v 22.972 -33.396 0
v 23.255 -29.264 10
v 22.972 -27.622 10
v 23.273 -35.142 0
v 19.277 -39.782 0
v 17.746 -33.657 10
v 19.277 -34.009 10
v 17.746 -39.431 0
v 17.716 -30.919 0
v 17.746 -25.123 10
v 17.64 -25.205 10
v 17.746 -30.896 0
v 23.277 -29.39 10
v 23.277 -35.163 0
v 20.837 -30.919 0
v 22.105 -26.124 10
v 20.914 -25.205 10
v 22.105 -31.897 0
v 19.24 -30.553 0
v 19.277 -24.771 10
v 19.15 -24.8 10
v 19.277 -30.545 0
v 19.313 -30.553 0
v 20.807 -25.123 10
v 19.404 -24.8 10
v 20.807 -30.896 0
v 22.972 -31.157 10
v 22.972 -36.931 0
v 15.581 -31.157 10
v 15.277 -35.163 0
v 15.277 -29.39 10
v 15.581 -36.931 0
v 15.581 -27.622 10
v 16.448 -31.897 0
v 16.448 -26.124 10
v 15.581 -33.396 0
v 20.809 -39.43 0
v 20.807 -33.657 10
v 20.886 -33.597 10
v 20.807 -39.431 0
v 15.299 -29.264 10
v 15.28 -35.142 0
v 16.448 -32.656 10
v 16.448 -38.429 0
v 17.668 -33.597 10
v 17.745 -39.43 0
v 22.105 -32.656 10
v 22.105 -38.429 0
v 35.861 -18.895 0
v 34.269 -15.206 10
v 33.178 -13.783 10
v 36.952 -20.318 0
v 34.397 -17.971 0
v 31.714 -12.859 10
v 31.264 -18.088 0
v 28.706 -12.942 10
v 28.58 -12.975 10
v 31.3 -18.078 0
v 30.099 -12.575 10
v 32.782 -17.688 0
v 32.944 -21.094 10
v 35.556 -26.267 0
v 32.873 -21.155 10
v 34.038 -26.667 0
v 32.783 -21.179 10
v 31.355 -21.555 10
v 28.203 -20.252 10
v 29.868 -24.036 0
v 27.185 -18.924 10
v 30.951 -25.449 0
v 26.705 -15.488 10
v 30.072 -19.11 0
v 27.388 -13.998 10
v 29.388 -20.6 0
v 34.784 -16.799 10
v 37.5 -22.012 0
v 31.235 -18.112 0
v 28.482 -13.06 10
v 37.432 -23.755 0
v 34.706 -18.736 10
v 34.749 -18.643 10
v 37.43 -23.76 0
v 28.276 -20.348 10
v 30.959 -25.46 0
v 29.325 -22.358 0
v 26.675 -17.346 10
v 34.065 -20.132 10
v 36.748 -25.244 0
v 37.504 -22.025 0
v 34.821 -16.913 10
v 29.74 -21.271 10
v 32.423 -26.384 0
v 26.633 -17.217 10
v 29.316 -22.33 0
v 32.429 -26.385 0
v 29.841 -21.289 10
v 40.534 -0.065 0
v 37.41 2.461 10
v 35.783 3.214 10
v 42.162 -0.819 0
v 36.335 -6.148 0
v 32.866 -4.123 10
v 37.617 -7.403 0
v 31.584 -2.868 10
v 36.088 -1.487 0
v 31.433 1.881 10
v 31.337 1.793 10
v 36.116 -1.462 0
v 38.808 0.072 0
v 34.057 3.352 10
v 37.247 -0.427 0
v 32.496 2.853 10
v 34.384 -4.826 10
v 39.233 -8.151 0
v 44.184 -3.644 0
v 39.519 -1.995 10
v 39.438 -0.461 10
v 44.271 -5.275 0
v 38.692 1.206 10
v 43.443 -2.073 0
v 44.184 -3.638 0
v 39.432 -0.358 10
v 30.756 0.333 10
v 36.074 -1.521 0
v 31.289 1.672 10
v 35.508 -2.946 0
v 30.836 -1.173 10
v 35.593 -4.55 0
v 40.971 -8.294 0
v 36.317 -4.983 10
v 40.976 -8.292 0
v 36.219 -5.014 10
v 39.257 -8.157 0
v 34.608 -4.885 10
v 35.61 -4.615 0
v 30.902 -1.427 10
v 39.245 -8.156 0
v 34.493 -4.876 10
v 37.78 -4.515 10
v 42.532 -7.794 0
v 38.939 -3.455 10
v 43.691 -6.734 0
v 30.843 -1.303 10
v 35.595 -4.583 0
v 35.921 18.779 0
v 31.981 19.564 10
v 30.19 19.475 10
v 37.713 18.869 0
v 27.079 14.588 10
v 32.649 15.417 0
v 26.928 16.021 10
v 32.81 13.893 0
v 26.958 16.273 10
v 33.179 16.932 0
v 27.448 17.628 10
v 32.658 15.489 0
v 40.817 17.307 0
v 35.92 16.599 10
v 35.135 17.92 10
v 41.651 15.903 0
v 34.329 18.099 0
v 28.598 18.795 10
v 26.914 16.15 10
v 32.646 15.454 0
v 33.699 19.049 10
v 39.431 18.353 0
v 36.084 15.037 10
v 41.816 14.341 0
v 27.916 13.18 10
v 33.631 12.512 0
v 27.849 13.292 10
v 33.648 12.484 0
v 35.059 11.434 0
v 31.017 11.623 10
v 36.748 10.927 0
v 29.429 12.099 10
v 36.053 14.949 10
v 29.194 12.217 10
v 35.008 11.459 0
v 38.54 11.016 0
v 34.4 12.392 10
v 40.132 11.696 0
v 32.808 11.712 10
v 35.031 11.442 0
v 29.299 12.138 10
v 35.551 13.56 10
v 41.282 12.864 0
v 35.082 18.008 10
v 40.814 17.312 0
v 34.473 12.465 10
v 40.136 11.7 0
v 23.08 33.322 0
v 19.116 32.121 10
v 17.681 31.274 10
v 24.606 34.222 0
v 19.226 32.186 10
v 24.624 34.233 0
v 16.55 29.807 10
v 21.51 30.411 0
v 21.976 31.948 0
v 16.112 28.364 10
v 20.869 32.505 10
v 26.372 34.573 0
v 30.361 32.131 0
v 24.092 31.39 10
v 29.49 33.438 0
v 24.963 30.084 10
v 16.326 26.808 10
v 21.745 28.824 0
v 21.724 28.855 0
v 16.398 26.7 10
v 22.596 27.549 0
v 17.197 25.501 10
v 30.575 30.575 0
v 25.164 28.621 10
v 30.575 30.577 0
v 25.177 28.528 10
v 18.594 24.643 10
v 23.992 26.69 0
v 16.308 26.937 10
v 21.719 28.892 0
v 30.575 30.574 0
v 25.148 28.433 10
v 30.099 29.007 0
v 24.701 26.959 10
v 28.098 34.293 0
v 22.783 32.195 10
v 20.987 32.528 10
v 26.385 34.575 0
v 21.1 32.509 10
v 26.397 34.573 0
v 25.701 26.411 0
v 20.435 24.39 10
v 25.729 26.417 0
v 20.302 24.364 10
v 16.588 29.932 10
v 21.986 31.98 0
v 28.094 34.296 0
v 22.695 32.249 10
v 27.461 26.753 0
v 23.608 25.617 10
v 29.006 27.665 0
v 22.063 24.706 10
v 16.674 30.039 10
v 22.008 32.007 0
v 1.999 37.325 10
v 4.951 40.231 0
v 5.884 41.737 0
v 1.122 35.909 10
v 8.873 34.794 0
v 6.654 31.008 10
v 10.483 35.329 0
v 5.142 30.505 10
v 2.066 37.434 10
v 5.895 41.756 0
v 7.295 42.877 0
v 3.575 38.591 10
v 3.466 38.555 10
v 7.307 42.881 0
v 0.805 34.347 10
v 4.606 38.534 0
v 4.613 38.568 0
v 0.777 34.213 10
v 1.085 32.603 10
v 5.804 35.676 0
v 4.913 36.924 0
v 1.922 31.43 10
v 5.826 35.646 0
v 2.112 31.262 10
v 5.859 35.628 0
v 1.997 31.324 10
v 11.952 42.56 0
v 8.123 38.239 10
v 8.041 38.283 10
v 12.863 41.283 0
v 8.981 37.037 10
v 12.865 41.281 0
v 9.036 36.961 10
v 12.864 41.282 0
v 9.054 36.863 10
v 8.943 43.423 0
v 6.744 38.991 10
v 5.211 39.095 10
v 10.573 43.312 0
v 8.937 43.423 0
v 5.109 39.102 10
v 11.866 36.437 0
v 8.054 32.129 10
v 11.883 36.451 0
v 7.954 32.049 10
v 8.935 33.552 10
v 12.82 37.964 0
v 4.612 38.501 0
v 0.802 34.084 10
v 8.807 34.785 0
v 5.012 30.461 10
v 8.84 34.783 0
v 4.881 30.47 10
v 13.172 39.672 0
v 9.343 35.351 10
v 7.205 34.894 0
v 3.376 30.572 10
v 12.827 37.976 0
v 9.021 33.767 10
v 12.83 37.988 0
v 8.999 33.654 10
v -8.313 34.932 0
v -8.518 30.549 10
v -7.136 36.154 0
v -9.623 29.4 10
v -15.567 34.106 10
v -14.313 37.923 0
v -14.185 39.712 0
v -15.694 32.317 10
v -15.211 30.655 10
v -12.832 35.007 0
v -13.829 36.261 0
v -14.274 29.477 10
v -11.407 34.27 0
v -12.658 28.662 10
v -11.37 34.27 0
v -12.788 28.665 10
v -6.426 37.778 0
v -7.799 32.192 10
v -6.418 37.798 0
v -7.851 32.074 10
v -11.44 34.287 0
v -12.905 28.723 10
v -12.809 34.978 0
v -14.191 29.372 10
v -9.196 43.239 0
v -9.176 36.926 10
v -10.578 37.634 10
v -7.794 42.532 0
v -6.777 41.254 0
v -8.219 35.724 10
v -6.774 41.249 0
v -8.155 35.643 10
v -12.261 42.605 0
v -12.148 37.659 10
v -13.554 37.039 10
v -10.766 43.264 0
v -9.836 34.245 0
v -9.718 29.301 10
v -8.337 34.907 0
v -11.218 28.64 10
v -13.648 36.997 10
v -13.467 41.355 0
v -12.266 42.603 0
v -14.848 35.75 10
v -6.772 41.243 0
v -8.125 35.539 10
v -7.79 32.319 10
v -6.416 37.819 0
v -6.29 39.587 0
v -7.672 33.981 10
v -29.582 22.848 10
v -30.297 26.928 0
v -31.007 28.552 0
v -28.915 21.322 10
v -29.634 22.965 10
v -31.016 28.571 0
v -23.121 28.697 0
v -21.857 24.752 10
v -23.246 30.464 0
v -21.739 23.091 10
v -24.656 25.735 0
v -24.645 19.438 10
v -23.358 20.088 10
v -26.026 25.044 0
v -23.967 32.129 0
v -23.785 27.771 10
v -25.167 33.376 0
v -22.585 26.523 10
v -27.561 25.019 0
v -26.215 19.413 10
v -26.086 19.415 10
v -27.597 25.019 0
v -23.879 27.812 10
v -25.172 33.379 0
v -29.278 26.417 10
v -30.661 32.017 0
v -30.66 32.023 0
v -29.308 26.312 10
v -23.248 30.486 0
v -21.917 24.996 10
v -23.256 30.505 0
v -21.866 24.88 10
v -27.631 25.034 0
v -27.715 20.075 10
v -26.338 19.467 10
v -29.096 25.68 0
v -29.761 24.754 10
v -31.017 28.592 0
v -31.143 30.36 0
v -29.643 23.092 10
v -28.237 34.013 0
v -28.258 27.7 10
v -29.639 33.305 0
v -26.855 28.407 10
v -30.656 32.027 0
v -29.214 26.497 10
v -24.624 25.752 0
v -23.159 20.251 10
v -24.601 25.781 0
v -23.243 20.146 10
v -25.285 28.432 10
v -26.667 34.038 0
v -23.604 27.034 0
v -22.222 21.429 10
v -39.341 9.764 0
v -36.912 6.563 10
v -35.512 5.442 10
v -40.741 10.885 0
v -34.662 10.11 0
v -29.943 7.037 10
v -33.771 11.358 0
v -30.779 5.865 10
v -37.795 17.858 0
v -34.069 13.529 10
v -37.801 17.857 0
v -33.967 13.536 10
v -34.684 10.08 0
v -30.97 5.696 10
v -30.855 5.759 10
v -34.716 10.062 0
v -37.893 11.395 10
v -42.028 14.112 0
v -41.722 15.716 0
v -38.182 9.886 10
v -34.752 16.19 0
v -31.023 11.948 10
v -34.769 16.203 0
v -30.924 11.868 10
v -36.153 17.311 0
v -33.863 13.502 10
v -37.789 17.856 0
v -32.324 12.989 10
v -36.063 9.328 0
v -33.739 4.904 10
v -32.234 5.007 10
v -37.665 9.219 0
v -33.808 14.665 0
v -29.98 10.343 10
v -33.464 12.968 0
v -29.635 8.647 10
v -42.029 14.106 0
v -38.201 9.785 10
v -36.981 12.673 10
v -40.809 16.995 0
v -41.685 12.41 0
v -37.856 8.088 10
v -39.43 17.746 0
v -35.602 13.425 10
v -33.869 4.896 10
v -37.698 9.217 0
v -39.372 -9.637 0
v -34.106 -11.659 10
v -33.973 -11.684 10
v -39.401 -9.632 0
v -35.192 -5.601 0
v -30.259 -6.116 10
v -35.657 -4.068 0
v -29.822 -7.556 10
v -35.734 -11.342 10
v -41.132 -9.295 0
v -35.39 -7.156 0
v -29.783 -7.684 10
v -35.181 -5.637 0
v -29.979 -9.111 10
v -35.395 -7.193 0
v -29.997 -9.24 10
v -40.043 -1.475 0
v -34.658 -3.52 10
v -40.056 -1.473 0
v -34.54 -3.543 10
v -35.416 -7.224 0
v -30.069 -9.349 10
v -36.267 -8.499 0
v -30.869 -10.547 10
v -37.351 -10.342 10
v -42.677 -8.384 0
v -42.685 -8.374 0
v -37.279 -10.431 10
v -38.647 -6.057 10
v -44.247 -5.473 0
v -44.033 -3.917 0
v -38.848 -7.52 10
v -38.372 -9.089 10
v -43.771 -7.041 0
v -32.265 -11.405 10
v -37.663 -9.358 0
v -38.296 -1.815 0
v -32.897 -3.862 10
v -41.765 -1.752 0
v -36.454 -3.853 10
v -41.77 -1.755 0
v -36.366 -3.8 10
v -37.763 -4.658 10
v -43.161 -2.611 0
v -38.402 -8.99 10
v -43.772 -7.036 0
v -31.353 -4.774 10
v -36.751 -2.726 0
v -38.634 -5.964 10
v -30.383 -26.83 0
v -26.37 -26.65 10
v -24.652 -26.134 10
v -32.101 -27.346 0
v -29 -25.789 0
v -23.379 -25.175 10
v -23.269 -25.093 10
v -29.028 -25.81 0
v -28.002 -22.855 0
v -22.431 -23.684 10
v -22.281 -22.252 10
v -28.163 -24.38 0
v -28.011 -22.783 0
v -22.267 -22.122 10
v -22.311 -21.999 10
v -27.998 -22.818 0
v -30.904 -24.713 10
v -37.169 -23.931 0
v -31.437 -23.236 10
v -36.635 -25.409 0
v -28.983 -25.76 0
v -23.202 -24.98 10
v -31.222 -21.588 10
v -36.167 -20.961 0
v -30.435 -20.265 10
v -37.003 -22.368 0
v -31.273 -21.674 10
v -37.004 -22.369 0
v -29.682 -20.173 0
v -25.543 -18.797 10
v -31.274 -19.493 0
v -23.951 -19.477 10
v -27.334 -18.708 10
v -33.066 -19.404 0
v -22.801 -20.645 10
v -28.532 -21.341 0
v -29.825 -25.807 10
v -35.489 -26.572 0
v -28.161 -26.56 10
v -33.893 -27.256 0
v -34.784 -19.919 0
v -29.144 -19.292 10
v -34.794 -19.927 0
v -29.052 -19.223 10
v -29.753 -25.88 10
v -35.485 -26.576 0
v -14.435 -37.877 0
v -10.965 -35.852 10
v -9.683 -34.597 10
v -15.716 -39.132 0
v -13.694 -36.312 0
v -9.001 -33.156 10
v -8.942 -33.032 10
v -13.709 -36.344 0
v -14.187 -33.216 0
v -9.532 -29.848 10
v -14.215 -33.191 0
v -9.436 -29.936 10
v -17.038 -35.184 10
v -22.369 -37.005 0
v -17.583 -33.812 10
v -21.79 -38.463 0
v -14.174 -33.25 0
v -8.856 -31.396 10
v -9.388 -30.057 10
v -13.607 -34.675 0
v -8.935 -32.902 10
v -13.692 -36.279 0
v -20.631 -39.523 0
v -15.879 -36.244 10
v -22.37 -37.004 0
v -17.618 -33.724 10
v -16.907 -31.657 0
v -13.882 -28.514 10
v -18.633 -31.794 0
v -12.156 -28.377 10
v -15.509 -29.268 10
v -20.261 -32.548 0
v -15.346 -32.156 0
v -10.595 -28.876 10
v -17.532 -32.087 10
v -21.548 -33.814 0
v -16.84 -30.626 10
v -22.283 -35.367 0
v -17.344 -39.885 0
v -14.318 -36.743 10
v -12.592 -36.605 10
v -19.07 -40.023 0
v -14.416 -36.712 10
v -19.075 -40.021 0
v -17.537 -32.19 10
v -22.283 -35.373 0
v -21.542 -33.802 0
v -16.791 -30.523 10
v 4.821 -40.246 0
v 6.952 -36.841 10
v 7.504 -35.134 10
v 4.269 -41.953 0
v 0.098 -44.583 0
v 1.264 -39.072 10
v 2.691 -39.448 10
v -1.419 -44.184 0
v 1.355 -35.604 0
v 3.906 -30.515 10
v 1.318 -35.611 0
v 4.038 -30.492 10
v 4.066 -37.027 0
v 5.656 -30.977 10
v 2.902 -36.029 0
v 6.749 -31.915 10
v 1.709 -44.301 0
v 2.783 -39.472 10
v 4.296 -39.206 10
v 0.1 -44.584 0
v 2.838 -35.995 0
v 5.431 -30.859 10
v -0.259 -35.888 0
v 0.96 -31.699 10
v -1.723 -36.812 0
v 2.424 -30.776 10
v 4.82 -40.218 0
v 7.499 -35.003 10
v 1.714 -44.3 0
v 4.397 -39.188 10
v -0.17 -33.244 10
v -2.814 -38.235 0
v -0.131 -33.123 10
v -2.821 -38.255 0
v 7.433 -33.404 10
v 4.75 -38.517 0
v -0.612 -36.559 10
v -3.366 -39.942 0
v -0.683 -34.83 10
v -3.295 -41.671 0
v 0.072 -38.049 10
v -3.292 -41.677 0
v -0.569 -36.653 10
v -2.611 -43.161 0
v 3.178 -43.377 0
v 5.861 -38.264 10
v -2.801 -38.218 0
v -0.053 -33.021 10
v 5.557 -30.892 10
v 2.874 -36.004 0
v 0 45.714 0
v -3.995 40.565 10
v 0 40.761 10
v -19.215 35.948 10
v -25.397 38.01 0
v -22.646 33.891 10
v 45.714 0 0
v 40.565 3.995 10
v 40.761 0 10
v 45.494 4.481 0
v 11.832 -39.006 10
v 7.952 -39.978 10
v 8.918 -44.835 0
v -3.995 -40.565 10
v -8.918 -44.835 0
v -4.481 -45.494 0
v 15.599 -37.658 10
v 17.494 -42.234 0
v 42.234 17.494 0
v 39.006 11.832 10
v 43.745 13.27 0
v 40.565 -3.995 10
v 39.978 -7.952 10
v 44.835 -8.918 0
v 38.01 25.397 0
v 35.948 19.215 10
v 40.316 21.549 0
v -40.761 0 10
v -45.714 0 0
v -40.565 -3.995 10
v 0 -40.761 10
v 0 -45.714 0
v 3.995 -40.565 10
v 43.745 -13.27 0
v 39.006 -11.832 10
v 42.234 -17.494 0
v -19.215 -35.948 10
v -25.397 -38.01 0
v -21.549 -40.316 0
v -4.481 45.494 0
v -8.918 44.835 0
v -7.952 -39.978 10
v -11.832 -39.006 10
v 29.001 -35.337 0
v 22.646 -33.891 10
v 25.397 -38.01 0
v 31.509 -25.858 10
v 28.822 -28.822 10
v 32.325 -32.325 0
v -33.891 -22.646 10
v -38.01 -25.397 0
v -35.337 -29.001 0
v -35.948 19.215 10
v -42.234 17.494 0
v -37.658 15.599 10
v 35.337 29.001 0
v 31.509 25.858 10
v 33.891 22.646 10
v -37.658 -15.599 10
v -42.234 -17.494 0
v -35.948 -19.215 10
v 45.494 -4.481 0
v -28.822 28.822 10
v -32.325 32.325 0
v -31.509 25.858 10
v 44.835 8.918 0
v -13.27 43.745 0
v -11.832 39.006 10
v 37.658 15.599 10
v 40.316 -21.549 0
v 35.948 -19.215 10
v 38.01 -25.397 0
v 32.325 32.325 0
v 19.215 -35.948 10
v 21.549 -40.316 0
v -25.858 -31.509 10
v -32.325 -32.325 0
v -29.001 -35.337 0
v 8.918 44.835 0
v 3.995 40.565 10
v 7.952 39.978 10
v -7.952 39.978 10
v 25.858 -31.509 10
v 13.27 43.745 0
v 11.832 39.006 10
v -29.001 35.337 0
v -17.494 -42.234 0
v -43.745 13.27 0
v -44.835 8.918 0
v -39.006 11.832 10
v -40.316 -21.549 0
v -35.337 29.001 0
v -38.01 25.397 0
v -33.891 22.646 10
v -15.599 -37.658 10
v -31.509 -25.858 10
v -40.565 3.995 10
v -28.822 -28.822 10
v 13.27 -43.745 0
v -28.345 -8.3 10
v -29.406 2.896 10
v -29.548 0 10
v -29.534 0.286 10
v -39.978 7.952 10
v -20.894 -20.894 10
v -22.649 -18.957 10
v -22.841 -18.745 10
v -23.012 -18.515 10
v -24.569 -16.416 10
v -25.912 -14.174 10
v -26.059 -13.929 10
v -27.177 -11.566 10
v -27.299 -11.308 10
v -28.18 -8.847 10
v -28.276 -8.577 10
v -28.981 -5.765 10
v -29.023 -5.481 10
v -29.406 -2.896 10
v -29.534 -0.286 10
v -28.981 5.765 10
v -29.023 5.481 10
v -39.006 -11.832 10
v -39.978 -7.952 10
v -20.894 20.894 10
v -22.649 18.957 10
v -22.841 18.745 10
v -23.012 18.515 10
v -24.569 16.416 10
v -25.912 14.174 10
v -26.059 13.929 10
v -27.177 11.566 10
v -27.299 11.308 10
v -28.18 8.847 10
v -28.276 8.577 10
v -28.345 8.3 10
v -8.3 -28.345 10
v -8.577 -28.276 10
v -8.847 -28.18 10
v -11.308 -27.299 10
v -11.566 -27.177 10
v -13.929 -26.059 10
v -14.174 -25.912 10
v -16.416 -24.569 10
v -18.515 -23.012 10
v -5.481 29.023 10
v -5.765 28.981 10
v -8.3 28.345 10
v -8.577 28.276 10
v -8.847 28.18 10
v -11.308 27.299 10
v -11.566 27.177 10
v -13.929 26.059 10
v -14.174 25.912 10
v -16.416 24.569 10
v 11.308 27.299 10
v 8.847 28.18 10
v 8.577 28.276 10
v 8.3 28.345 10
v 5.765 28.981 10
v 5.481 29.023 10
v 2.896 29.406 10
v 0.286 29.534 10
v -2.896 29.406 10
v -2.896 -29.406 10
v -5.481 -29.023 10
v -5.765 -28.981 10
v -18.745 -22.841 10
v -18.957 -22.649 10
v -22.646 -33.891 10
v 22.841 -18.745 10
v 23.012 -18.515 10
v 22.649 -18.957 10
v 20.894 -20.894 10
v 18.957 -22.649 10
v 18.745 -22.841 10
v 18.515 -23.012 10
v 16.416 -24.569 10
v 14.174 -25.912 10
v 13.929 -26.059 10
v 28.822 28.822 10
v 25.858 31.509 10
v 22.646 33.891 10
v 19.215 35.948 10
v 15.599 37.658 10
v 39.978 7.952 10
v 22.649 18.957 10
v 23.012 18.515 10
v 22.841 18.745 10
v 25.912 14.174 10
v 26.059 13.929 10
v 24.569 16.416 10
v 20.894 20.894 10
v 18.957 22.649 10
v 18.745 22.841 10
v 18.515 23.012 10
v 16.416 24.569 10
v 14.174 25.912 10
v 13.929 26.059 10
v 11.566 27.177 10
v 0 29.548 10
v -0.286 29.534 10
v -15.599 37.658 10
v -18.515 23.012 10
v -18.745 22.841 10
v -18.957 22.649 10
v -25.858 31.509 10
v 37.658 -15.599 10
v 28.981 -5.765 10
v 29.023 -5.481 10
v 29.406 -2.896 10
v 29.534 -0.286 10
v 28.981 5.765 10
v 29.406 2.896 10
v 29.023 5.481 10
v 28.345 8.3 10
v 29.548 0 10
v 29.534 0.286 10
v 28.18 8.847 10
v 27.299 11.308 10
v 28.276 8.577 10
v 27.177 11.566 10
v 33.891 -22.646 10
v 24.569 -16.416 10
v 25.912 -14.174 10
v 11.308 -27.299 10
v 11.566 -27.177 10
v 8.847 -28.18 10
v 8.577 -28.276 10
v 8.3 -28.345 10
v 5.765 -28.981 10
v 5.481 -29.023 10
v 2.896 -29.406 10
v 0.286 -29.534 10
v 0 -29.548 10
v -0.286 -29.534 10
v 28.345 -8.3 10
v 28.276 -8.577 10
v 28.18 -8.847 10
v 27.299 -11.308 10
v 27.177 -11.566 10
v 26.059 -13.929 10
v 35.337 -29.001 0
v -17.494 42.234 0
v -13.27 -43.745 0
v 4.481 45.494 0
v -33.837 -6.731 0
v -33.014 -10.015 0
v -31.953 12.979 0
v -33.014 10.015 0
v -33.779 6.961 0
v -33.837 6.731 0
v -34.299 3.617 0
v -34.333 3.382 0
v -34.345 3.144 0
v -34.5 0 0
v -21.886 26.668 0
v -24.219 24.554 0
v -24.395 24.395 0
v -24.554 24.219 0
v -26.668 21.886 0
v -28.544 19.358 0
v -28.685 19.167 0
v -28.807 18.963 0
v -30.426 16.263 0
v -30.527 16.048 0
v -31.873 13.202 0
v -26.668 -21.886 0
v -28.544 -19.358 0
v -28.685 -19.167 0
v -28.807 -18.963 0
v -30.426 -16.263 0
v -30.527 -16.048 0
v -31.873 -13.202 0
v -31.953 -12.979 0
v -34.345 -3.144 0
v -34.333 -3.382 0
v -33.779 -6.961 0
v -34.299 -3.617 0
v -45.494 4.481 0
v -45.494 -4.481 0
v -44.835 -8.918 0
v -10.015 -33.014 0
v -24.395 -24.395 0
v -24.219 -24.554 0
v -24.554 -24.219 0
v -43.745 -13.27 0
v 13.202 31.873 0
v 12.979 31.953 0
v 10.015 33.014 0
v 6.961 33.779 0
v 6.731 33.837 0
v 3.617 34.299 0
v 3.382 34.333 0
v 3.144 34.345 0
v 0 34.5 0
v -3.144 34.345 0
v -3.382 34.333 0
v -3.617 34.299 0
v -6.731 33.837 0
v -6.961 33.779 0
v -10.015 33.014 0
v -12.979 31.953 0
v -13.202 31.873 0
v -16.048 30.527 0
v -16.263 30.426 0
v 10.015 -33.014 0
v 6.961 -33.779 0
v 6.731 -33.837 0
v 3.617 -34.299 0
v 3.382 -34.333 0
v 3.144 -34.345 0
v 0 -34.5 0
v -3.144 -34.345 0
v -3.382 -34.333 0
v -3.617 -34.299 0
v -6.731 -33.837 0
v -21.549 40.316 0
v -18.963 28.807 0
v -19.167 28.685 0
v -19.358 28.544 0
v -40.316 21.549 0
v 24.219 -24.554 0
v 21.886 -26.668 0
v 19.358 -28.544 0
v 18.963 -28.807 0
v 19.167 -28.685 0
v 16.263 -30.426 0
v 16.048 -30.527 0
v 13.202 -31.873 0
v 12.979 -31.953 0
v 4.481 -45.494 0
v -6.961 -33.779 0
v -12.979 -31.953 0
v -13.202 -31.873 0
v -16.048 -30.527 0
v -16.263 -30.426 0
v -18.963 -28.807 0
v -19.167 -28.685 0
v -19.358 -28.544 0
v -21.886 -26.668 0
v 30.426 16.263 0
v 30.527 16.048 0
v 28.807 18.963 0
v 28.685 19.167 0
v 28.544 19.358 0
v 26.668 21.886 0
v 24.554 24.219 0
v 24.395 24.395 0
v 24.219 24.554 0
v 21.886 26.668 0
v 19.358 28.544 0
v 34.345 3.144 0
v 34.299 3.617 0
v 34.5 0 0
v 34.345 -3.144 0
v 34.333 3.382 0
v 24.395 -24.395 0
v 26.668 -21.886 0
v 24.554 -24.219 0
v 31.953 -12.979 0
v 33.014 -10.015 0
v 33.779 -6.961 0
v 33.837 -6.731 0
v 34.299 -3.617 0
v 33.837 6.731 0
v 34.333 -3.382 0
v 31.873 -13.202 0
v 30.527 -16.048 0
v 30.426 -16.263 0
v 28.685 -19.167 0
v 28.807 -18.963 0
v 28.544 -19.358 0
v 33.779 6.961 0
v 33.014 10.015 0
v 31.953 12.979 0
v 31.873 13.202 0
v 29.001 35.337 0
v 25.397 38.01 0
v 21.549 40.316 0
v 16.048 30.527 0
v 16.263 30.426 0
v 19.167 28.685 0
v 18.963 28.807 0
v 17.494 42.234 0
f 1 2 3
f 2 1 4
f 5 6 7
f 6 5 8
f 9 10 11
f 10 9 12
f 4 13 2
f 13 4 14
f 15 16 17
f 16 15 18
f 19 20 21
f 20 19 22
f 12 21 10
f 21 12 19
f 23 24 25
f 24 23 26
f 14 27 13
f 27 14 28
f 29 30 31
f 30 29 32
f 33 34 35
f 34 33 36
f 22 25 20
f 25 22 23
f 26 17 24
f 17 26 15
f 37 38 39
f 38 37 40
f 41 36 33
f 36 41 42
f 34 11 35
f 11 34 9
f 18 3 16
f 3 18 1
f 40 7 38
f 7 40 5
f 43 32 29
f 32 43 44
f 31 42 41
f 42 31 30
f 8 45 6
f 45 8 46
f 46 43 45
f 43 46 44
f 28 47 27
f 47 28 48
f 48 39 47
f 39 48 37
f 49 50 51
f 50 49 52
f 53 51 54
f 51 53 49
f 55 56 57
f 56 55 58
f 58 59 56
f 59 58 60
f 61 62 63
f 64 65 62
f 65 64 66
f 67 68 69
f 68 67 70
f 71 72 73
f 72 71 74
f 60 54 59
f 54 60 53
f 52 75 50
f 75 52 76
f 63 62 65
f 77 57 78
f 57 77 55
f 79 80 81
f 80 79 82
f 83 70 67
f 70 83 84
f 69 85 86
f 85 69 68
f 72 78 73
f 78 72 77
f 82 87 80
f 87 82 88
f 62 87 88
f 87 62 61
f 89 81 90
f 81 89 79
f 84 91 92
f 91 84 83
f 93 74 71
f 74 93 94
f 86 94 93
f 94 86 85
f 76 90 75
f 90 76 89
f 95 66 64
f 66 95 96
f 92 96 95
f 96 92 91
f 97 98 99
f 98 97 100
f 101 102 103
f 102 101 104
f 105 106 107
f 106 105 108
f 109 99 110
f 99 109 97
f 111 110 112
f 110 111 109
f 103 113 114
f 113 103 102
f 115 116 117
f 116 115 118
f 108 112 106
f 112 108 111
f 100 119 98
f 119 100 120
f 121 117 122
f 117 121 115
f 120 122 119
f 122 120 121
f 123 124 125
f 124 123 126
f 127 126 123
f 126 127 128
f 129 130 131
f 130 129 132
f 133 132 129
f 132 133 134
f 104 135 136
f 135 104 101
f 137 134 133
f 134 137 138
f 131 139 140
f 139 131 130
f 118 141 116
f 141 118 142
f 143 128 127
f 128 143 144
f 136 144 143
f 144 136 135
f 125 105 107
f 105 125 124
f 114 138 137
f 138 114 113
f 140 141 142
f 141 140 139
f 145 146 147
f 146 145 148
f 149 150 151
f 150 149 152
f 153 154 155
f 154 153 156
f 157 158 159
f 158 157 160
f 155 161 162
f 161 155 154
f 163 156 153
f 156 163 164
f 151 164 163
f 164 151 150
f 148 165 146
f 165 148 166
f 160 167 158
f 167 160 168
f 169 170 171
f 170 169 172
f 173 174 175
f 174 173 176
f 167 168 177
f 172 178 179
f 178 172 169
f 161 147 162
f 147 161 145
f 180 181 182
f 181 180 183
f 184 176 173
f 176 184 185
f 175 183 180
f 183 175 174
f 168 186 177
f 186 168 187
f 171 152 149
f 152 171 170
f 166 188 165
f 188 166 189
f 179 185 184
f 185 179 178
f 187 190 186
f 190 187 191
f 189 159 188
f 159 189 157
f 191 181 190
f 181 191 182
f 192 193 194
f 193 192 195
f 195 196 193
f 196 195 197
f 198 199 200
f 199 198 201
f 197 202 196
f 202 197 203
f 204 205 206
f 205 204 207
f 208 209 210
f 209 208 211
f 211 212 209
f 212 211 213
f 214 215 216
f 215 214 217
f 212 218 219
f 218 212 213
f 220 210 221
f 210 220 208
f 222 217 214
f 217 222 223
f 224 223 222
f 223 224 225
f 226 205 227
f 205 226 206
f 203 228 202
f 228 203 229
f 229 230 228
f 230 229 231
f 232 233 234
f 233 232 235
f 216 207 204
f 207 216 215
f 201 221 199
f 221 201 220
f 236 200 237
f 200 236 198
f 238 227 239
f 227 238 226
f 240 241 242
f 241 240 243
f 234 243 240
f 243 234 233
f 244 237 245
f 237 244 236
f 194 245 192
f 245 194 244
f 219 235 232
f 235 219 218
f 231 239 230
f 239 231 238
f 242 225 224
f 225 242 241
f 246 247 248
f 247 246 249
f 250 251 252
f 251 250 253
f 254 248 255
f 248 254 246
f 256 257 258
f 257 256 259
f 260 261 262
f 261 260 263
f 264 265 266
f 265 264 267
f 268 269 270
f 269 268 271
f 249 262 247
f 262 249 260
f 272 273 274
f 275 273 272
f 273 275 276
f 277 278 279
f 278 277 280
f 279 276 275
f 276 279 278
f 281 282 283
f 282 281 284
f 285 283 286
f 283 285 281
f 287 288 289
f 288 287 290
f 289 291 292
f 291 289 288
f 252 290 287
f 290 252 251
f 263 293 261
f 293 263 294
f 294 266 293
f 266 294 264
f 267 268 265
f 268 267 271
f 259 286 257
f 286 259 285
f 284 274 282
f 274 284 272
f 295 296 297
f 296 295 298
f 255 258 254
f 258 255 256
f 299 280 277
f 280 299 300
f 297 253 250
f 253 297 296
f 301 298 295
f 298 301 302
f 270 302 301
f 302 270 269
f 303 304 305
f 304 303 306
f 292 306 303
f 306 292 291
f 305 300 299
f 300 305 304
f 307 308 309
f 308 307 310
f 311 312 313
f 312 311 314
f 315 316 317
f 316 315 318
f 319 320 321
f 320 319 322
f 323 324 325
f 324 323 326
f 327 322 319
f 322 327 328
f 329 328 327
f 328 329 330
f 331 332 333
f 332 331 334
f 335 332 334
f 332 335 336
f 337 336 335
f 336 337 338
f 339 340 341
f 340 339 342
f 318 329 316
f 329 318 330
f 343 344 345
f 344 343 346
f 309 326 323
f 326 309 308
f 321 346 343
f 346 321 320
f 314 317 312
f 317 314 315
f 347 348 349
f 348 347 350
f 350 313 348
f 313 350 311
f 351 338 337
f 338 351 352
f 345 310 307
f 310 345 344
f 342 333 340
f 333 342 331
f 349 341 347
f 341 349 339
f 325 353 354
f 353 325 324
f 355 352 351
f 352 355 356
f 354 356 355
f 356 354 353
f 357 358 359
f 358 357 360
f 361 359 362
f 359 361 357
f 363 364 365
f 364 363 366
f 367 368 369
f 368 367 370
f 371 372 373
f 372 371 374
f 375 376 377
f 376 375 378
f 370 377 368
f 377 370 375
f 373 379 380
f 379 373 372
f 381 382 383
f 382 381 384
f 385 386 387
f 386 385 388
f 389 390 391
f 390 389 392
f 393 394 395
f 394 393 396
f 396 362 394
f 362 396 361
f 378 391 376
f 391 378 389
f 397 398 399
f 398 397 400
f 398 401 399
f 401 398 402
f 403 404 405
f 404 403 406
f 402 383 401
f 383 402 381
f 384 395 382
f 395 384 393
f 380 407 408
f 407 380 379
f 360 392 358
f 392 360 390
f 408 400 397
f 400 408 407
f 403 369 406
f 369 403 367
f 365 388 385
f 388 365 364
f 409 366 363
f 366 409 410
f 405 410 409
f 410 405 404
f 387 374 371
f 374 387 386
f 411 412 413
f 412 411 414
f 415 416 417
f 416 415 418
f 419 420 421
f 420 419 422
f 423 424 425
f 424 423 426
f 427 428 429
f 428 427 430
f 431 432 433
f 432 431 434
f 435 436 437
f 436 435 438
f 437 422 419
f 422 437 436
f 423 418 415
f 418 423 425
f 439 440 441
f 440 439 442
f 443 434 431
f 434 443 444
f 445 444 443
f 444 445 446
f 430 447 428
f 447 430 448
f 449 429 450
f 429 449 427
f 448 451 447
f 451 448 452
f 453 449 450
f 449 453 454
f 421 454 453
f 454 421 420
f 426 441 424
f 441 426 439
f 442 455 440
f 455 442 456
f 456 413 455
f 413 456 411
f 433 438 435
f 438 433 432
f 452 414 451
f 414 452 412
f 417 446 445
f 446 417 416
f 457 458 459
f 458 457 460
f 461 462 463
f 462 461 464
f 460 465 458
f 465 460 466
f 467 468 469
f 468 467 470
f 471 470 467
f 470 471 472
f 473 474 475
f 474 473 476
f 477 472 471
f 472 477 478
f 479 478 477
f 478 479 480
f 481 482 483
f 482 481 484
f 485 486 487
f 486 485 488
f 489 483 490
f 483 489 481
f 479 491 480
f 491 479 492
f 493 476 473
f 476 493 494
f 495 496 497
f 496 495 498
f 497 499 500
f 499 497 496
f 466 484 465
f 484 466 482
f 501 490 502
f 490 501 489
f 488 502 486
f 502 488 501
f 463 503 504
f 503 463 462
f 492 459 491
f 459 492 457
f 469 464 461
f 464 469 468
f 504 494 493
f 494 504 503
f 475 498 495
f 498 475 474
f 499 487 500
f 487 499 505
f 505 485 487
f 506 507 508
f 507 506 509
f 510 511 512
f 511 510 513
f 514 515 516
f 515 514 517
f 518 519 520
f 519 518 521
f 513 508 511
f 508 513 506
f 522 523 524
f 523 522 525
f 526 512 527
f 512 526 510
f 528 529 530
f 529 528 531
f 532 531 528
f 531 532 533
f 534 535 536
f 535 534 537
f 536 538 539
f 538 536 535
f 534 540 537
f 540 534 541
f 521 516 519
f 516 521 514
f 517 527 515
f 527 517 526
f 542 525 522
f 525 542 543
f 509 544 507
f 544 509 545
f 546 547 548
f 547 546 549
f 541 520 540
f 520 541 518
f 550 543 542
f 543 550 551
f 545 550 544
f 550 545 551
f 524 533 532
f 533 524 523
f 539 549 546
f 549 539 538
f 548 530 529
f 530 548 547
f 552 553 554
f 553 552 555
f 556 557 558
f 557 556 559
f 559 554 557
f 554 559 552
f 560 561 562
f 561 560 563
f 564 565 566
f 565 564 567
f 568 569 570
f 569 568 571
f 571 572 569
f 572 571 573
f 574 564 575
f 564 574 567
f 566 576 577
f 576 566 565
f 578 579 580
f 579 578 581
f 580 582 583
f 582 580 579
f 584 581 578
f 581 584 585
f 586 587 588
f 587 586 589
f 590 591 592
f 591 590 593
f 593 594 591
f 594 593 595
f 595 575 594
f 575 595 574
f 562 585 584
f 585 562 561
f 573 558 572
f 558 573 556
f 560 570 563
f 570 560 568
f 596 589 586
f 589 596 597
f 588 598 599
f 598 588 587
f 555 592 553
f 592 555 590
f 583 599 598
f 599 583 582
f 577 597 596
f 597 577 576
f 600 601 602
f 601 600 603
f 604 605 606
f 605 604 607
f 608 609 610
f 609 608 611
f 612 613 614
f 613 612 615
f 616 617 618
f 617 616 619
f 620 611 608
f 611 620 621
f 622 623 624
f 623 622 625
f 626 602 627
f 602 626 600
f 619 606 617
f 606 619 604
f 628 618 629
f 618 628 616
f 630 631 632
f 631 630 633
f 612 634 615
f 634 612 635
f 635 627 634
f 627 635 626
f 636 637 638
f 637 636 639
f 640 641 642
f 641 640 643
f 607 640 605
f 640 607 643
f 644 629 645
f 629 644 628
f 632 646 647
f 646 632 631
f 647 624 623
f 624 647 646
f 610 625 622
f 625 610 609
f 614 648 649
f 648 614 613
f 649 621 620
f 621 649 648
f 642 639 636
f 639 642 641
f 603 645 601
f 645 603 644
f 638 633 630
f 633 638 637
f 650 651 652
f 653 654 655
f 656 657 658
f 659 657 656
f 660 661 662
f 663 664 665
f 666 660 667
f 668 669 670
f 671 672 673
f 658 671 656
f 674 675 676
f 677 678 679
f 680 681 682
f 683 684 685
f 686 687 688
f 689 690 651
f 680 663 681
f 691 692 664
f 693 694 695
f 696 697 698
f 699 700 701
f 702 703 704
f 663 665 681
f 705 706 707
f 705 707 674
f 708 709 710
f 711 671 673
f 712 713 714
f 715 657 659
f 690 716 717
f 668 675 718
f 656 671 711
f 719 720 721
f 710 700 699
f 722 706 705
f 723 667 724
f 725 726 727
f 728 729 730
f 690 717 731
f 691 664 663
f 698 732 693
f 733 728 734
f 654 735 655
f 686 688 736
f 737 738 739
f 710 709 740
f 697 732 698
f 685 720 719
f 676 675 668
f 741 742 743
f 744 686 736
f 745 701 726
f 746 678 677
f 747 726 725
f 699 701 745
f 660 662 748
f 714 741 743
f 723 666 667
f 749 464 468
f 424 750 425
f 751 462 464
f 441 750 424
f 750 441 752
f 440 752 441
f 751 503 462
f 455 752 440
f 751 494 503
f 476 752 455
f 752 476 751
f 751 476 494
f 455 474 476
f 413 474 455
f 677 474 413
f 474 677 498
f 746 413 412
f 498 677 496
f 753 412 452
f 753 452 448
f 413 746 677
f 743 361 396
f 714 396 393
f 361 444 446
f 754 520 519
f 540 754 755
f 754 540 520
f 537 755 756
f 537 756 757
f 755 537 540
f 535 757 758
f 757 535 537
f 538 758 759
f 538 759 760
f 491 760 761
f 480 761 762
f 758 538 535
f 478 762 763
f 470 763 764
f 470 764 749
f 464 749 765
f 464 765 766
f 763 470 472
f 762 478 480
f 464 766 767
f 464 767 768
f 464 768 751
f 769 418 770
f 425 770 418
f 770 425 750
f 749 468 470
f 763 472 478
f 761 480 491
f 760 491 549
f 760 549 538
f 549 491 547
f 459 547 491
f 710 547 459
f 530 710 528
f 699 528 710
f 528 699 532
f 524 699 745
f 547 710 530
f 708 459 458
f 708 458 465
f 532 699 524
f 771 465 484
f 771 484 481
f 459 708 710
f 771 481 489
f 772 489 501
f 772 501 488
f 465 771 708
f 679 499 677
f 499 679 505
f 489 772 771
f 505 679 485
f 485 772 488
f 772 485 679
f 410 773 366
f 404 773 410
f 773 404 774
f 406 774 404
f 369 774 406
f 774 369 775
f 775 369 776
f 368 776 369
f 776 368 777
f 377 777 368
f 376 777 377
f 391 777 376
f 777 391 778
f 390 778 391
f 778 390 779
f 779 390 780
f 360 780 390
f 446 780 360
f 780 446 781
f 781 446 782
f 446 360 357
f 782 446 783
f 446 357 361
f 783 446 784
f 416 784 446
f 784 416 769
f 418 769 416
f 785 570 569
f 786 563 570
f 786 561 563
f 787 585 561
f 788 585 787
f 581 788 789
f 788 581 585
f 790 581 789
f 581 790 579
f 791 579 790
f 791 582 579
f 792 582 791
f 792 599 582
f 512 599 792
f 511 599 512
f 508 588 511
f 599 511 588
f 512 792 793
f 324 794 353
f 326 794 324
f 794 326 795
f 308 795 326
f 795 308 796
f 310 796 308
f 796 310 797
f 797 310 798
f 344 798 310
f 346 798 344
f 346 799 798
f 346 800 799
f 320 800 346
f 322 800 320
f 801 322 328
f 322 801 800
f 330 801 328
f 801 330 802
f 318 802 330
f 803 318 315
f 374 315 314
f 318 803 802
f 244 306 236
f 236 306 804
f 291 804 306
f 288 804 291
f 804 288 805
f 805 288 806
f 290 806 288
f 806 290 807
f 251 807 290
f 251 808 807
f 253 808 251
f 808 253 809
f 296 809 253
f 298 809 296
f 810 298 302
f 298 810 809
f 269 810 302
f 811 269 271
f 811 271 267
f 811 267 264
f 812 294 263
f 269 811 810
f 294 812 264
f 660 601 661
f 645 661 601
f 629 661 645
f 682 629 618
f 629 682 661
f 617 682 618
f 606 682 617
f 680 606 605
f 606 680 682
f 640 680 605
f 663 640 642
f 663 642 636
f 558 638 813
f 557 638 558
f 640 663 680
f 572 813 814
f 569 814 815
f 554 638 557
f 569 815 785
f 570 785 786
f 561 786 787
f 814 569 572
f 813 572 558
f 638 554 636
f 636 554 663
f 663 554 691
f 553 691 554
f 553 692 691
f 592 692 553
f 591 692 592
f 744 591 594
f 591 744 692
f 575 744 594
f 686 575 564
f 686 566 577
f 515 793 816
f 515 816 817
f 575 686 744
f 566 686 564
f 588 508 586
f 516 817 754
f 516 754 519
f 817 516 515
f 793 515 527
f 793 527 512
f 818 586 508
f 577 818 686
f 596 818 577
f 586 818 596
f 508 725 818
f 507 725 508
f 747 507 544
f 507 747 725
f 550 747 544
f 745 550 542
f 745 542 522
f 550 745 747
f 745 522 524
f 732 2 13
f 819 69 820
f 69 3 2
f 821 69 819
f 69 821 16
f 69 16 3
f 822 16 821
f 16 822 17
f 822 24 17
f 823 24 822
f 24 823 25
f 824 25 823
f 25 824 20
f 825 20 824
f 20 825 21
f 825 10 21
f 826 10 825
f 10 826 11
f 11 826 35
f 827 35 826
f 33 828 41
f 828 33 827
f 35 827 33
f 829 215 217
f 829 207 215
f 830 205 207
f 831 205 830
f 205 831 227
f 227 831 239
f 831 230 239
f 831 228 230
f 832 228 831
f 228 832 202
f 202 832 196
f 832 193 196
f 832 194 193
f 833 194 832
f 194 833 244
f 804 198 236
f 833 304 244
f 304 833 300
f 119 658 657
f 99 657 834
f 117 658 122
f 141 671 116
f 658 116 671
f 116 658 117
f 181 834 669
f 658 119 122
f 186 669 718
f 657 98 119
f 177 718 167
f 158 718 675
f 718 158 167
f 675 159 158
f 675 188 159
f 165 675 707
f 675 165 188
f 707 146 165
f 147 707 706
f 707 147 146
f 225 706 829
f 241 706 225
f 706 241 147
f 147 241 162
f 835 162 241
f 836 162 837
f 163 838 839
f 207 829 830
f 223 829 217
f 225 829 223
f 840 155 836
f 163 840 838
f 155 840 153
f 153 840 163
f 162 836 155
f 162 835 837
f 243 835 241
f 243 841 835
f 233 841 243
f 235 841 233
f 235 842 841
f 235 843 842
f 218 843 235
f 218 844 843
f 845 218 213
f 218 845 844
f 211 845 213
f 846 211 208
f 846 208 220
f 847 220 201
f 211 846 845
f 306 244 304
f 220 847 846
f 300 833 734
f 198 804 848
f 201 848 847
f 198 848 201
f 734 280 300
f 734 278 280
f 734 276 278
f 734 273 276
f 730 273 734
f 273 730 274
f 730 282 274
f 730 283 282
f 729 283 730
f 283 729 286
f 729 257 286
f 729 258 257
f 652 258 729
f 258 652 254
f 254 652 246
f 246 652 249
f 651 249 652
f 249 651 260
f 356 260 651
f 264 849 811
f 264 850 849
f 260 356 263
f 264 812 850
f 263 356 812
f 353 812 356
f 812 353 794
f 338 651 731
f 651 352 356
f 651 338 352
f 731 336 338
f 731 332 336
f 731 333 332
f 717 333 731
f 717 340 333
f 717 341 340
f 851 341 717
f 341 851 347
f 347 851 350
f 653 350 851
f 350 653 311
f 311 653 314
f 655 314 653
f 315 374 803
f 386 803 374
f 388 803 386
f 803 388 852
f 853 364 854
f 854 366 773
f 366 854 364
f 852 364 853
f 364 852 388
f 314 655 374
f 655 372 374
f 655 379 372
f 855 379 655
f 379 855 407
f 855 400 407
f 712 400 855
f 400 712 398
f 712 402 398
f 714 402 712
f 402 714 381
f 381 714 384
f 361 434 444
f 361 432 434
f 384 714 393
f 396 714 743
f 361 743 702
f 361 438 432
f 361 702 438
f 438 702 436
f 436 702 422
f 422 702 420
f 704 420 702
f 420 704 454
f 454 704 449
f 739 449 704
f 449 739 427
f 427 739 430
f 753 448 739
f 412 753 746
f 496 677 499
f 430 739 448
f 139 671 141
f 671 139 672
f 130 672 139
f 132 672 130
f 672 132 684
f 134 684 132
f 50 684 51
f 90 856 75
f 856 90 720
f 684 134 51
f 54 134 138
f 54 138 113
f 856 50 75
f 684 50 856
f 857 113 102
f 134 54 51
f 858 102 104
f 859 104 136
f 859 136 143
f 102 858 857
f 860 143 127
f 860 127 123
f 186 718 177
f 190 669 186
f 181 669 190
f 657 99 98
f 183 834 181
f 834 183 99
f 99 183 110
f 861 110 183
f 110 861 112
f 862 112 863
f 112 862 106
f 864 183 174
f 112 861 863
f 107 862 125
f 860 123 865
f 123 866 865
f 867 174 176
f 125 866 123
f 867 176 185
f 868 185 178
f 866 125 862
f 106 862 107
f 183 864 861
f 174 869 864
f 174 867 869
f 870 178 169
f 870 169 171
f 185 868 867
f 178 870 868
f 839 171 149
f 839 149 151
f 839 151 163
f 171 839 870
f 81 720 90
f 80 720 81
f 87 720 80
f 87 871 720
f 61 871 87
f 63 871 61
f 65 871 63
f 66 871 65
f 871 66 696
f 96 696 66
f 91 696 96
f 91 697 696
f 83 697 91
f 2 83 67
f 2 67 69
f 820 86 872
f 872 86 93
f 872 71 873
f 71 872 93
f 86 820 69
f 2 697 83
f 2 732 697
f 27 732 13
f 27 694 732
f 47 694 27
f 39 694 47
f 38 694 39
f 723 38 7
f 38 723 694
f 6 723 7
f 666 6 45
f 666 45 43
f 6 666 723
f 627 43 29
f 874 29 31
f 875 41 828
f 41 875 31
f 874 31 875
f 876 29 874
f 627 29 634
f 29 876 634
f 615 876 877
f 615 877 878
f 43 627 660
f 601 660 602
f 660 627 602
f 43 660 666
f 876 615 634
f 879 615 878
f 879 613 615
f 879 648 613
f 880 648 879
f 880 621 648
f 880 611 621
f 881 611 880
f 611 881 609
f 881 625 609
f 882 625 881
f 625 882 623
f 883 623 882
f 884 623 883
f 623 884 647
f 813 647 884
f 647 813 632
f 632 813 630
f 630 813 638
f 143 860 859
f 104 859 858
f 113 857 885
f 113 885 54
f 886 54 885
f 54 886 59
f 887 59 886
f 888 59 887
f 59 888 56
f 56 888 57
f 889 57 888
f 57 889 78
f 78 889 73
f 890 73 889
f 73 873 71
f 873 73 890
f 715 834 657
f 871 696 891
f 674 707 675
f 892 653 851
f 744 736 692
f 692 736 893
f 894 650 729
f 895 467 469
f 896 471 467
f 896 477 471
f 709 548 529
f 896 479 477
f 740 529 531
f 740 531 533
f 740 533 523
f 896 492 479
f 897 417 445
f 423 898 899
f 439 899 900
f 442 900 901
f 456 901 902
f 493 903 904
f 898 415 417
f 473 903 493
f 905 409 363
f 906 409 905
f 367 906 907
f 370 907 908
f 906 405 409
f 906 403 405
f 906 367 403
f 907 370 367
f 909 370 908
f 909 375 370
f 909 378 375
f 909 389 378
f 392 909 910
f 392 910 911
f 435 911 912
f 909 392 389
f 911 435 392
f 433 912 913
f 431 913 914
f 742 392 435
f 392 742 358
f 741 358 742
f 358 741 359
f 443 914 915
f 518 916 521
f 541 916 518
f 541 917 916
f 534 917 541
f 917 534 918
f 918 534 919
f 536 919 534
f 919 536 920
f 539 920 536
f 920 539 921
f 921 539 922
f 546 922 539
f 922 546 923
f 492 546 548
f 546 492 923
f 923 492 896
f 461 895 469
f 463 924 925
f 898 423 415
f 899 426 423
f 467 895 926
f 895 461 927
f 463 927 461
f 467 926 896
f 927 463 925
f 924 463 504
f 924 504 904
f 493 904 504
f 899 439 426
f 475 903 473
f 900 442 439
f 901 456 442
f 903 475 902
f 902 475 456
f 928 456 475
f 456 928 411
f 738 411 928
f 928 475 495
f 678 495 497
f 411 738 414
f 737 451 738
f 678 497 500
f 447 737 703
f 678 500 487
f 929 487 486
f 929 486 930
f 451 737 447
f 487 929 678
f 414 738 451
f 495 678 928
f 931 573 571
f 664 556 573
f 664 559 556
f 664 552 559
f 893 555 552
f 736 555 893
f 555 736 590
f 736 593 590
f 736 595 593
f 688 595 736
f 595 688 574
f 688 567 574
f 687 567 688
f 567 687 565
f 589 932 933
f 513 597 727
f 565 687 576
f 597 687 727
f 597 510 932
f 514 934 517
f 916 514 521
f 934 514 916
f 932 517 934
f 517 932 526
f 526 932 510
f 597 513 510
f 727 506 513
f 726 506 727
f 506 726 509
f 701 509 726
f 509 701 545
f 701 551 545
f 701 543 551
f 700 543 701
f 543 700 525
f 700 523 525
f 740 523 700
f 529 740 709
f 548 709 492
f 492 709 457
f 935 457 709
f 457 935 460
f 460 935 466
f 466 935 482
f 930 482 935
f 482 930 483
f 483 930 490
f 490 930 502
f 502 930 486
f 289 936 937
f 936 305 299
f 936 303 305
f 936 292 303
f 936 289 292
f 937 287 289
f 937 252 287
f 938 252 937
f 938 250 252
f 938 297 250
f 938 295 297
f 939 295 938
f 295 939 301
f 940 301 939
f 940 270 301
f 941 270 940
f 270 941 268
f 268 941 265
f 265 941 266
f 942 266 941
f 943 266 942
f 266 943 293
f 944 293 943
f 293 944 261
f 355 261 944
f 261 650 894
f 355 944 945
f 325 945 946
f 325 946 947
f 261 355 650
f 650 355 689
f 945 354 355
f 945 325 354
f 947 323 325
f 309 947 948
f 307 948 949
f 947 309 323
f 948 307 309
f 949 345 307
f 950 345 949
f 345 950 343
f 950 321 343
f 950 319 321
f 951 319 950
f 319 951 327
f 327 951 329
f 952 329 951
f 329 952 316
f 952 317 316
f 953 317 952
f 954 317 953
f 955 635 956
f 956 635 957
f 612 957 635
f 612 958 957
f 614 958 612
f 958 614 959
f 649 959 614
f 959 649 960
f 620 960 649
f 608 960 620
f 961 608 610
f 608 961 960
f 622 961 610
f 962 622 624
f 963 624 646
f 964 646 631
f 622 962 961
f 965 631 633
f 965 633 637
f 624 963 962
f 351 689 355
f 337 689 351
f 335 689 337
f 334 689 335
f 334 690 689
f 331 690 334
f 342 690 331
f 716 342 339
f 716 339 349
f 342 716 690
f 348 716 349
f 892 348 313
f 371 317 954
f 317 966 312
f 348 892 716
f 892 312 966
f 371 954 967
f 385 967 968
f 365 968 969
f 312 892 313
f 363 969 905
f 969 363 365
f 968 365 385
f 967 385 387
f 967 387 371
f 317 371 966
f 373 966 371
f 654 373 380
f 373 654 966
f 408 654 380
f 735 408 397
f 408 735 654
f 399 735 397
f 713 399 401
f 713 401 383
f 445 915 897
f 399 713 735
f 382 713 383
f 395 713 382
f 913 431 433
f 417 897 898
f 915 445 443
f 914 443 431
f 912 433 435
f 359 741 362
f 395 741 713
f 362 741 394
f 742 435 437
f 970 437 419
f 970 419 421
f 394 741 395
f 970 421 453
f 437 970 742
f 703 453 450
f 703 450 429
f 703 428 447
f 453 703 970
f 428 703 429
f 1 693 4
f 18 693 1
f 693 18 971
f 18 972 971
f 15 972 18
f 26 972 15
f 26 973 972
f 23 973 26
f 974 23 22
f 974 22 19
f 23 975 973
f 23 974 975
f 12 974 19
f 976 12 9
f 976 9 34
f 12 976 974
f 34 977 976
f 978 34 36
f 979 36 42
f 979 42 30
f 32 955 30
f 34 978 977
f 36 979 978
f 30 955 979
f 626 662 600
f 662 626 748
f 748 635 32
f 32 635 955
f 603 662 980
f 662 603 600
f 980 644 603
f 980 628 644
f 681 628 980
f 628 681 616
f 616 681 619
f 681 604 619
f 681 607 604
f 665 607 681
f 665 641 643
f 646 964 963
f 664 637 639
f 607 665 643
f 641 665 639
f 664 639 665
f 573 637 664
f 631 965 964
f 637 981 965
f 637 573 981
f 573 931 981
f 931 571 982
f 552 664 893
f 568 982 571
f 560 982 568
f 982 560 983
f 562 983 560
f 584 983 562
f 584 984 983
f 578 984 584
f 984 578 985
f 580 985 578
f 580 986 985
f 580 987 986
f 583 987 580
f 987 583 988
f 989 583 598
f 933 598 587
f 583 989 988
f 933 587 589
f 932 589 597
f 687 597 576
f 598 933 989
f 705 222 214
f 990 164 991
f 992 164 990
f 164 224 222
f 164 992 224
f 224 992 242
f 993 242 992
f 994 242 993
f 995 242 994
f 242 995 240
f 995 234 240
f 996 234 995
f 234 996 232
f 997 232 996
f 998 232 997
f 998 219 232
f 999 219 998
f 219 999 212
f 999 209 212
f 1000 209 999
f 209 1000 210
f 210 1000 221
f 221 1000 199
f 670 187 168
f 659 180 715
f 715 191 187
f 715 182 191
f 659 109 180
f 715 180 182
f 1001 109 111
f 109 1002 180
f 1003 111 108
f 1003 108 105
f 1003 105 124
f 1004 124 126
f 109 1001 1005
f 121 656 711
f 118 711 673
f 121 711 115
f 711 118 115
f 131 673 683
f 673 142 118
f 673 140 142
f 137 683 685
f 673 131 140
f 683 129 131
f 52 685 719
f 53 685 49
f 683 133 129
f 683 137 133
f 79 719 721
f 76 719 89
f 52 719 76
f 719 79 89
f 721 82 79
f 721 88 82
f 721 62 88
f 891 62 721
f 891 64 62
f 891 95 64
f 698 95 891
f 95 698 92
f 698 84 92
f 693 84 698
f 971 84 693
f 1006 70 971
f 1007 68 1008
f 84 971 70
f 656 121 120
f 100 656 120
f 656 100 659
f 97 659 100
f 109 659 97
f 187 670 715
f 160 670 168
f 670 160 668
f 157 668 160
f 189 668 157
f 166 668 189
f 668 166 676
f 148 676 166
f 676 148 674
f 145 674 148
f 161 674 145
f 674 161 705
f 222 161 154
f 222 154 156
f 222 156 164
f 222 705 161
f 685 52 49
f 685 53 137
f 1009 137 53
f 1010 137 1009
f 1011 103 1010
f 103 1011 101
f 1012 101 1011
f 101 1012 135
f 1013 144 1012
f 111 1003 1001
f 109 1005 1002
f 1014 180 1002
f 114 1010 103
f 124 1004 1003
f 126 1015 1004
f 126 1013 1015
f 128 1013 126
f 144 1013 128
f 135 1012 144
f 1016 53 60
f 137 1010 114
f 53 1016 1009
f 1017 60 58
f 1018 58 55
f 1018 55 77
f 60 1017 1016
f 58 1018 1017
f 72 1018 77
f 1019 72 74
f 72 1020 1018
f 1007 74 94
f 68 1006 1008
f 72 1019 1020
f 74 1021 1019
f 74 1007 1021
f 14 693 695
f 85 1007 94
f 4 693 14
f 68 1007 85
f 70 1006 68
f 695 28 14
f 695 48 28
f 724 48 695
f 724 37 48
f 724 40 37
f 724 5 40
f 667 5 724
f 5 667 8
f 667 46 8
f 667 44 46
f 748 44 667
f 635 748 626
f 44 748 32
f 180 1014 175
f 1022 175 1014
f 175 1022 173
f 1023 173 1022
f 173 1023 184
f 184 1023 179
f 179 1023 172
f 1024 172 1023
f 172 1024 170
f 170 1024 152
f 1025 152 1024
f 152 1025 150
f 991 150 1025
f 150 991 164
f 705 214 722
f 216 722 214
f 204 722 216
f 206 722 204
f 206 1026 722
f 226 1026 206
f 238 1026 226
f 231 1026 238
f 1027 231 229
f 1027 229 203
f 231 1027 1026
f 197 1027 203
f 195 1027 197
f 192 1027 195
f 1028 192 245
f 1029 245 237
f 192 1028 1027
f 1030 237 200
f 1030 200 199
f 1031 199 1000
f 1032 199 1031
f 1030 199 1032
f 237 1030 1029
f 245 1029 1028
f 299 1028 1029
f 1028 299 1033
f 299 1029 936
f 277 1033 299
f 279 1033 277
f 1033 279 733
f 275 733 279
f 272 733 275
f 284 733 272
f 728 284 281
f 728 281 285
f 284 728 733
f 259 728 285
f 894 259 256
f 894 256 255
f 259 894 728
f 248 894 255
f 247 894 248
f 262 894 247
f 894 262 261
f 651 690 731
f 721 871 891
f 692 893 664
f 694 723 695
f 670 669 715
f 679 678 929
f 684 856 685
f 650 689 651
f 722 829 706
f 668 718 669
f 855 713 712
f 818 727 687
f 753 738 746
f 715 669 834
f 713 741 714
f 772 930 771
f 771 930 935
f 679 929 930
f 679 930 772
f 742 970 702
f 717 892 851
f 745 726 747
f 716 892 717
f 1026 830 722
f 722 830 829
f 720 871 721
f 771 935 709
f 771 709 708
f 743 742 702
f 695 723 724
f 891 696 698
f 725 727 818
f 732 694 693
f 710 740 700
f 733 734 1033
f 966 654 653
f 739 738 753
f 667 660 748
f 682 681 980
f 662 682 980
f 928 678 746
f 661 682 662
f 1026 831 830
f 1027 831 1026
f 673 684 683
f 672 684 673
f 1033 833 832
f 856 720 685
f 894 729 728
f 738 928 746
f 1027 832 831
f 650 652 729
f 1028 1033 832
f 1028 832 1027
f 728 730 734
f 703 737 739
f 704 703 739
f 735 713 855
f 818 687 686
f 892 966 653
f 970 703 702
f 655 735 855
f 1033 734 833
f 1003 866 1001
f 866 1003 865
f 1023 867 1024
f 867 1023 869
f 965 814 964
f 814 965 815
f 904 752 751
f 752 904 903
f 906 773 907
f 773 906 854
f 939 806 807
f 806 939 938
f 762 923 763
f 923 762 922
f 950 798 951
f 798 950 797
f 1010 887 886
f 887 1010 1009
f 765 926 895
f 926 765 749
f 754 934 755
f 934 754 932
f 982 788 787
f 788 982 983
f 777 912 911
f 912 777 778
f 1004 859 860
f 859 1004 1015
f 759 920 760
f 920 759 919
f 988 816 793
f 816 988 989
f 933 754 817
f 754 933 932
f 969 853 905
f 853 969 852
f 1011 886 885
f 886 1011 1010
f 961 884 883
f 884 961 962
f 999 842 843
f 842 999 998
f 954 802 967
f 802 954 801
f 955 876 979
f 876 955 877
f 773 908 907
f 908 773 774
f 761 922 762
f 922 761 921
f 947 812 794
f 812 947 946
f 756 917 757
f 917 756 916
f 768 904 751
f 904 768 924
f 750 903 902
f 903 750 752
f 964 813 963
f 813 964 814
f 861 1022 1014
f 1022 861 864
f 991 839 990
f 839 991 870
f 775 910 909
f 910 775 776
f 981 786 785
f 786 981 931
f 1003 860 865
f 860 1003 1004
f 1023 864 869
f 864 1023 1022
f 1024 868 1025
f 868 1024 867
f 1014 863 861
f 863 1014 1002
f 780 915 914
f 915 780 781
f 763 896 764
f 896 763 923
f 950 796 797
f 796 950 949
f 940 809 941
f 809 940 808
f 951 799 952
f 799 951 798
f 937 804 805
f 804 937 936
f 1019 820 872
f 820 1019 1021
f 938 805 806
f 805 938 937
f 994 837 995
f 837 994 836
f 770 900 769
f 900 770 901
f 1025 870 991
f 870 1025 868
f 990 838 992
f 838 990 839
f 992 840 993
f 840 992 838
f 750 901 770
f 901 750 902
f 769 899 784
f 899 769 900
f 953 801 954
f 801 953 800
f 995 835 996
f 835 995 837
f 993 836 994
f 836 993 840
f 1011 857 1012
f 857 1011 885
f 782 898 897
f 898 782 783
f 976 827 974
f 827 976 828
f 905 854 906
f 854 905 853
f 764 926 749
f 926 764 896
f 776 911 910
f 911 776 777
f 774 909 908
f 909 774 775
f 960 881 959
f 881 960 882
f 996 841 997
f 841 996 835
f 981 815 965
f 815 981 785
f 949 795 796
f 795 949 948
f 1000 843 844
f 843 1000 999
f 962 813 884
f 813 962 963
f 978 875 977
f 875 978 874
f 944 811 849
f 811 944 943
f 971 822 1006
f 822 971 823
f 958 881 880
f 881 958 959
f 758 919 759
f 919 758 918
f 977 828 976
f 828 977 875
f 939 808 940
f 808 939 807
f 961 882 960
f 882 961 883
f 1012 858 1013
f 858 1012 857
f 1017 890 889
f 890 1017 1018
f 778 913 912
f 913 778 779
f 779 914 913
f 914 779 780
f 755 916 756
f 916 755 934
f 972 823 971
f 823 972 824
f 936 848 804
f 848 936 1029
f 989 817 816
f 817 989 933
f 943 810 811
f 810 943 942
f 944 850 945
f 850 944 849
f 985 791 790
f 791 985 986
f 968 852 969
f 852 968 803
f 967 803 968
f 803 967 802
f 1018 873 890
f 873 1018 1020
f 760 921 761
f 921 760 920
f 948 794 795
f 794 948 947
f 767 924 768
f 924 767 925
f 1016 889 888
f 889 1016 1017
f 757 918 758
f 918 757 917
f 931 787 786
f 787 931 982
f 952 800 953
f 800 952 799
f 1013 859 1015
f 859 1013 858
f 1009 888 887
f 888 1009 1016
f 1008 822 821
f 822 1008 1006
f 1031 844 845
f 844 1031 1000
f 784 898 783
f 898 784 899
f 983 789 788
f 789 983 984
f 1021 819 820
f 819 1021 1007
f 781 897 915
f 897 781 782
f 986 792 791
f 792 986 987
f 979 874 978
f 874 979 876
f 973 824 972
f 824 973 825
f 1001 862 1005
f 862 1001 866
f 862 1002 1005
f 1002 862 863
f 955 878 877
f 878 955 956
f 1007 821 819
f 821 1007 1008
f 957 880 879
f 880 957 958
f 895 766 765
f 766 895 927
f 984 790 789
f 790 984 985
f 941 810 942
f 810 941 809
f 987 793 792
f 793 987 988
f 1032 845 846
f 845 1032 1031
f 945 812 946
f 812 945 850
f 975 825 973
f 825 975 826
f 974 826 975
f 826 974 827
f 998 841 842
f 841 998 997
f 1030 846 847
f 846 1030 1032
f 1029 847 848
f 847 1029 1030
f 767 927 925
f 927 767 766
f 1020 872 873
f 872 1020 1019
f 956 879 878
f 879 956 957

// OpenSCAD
// file: hyperbolic_pencil_holder.scad
// author: clayb.rpi@gmail.com
// date: 2013-11-24
// units: mm
//
// description: a ring to hold a bunch of pencils at an angle
// so the lean on each other.
//
// derived from: http://www.thingiverse.com/thing:8433

//-------------
// User input 
//-------------

// The number of pencils the stand should hold.
NUM_PENCILS = 13;

// The diameter of each pencil
PENCIL_DIAMETER = 8;

// The length of each pencil
PENCIL_LENGTH = 190;

// The angle the pencils should stand at
LEAN_ANGLE = 30;

// The height of the base
BASE_HEIGHT = 10;

// The width of walls around the base.
WALL_WIDTH = 1;

// Shift the intersetion point from the center of the pencils.
PENCIL_SHIFT = 30;

/* [Hidden] */
$fn = 64;


//--------------------------
// Calculated values.
//--------------------------
leanAngle = min(80, max(-80, LEAN_ANGLE));
numPencils = max(2, NUM_PENCILS);
baseHeight = max(0, BASE_HEIGHT);
wallWidth = max(0, WALL_WIDTH);

rodRadius = max(0, PENCIL_DIAMETER) / 2;
rodCutLength = max(BASE_HEIGHT, PENCIL_LENGTH) + 2 * rodRadius * tan(leanAngle);
rodLength = rodCutLength / 2 - PENCIL_SHIFT;

// An offset from the center of the pencils (where they are closet) to their bottoms.
bottom = sin(leanAngle) * rodRadius - cos(leanAngle) * rodLength;

// An approximation of how wide the pencils are when leaning.
a = rodRadius / cos(leanAngle);
b = rodRadius;
theta = 90 / numPencils;

// average of the elliptical angle and the maximal radii to account overlap.
effectiveRodRadius = ((a * b) / sqrt(pow(b * cos(theta), 2) + pow(a * sin(theta), 2)) + a) / 2;

function xRodOffset(h) = effectiveRodRadius / sin(360 / (2 * numPencils));
function yRodOffset(h) = (h - effectiveRodRadius) / tan(90 - leanAngle);
function zRodRadius(h) = sqrt(pow(xRodOffset(h), 2) + pow(yRodOffset(h), 2));

// Debugging output.
echo("base outer diameter", 2 * (zRodRadius(bottom) + effectiveRodRadius + wallWidth));

difference() {
  // the actual base.
  cylinder(r1=zRodRadius(bottom) + effectiveRodRadius + wallWidth,
           r2=zRodRadius(bottom + baseHeight) + effectiveRodRadius + wallWidth,
           h=baseHeight);

  // cut out a hole in the center.
  translate([0, 0, -1])
  cylinder(r1=zRodRadius(bottom - 1) - effectiveRodRadius - wallWidth,
           r2=zRodRadius(bottom + baseHeight + 1) - effectiveRodRadius - wallWidth,
           h=baseHeight + 2);

  #
  // cut out the pencils.
  for (i = [0 : numPencils- 1 ]) {
    rotate([0, 0, i * 360 / numPencils])
    translate([xRodOffset(bottom), yRodOffset(bottom), 0])
    rotate([-leanAngle, 0, 0])
    translate([0, 0, -rodRadius * tan(leanAngle)])
    cylinder(r=rodRadius, h=rodCutLength, $fn=16);
  }
}
